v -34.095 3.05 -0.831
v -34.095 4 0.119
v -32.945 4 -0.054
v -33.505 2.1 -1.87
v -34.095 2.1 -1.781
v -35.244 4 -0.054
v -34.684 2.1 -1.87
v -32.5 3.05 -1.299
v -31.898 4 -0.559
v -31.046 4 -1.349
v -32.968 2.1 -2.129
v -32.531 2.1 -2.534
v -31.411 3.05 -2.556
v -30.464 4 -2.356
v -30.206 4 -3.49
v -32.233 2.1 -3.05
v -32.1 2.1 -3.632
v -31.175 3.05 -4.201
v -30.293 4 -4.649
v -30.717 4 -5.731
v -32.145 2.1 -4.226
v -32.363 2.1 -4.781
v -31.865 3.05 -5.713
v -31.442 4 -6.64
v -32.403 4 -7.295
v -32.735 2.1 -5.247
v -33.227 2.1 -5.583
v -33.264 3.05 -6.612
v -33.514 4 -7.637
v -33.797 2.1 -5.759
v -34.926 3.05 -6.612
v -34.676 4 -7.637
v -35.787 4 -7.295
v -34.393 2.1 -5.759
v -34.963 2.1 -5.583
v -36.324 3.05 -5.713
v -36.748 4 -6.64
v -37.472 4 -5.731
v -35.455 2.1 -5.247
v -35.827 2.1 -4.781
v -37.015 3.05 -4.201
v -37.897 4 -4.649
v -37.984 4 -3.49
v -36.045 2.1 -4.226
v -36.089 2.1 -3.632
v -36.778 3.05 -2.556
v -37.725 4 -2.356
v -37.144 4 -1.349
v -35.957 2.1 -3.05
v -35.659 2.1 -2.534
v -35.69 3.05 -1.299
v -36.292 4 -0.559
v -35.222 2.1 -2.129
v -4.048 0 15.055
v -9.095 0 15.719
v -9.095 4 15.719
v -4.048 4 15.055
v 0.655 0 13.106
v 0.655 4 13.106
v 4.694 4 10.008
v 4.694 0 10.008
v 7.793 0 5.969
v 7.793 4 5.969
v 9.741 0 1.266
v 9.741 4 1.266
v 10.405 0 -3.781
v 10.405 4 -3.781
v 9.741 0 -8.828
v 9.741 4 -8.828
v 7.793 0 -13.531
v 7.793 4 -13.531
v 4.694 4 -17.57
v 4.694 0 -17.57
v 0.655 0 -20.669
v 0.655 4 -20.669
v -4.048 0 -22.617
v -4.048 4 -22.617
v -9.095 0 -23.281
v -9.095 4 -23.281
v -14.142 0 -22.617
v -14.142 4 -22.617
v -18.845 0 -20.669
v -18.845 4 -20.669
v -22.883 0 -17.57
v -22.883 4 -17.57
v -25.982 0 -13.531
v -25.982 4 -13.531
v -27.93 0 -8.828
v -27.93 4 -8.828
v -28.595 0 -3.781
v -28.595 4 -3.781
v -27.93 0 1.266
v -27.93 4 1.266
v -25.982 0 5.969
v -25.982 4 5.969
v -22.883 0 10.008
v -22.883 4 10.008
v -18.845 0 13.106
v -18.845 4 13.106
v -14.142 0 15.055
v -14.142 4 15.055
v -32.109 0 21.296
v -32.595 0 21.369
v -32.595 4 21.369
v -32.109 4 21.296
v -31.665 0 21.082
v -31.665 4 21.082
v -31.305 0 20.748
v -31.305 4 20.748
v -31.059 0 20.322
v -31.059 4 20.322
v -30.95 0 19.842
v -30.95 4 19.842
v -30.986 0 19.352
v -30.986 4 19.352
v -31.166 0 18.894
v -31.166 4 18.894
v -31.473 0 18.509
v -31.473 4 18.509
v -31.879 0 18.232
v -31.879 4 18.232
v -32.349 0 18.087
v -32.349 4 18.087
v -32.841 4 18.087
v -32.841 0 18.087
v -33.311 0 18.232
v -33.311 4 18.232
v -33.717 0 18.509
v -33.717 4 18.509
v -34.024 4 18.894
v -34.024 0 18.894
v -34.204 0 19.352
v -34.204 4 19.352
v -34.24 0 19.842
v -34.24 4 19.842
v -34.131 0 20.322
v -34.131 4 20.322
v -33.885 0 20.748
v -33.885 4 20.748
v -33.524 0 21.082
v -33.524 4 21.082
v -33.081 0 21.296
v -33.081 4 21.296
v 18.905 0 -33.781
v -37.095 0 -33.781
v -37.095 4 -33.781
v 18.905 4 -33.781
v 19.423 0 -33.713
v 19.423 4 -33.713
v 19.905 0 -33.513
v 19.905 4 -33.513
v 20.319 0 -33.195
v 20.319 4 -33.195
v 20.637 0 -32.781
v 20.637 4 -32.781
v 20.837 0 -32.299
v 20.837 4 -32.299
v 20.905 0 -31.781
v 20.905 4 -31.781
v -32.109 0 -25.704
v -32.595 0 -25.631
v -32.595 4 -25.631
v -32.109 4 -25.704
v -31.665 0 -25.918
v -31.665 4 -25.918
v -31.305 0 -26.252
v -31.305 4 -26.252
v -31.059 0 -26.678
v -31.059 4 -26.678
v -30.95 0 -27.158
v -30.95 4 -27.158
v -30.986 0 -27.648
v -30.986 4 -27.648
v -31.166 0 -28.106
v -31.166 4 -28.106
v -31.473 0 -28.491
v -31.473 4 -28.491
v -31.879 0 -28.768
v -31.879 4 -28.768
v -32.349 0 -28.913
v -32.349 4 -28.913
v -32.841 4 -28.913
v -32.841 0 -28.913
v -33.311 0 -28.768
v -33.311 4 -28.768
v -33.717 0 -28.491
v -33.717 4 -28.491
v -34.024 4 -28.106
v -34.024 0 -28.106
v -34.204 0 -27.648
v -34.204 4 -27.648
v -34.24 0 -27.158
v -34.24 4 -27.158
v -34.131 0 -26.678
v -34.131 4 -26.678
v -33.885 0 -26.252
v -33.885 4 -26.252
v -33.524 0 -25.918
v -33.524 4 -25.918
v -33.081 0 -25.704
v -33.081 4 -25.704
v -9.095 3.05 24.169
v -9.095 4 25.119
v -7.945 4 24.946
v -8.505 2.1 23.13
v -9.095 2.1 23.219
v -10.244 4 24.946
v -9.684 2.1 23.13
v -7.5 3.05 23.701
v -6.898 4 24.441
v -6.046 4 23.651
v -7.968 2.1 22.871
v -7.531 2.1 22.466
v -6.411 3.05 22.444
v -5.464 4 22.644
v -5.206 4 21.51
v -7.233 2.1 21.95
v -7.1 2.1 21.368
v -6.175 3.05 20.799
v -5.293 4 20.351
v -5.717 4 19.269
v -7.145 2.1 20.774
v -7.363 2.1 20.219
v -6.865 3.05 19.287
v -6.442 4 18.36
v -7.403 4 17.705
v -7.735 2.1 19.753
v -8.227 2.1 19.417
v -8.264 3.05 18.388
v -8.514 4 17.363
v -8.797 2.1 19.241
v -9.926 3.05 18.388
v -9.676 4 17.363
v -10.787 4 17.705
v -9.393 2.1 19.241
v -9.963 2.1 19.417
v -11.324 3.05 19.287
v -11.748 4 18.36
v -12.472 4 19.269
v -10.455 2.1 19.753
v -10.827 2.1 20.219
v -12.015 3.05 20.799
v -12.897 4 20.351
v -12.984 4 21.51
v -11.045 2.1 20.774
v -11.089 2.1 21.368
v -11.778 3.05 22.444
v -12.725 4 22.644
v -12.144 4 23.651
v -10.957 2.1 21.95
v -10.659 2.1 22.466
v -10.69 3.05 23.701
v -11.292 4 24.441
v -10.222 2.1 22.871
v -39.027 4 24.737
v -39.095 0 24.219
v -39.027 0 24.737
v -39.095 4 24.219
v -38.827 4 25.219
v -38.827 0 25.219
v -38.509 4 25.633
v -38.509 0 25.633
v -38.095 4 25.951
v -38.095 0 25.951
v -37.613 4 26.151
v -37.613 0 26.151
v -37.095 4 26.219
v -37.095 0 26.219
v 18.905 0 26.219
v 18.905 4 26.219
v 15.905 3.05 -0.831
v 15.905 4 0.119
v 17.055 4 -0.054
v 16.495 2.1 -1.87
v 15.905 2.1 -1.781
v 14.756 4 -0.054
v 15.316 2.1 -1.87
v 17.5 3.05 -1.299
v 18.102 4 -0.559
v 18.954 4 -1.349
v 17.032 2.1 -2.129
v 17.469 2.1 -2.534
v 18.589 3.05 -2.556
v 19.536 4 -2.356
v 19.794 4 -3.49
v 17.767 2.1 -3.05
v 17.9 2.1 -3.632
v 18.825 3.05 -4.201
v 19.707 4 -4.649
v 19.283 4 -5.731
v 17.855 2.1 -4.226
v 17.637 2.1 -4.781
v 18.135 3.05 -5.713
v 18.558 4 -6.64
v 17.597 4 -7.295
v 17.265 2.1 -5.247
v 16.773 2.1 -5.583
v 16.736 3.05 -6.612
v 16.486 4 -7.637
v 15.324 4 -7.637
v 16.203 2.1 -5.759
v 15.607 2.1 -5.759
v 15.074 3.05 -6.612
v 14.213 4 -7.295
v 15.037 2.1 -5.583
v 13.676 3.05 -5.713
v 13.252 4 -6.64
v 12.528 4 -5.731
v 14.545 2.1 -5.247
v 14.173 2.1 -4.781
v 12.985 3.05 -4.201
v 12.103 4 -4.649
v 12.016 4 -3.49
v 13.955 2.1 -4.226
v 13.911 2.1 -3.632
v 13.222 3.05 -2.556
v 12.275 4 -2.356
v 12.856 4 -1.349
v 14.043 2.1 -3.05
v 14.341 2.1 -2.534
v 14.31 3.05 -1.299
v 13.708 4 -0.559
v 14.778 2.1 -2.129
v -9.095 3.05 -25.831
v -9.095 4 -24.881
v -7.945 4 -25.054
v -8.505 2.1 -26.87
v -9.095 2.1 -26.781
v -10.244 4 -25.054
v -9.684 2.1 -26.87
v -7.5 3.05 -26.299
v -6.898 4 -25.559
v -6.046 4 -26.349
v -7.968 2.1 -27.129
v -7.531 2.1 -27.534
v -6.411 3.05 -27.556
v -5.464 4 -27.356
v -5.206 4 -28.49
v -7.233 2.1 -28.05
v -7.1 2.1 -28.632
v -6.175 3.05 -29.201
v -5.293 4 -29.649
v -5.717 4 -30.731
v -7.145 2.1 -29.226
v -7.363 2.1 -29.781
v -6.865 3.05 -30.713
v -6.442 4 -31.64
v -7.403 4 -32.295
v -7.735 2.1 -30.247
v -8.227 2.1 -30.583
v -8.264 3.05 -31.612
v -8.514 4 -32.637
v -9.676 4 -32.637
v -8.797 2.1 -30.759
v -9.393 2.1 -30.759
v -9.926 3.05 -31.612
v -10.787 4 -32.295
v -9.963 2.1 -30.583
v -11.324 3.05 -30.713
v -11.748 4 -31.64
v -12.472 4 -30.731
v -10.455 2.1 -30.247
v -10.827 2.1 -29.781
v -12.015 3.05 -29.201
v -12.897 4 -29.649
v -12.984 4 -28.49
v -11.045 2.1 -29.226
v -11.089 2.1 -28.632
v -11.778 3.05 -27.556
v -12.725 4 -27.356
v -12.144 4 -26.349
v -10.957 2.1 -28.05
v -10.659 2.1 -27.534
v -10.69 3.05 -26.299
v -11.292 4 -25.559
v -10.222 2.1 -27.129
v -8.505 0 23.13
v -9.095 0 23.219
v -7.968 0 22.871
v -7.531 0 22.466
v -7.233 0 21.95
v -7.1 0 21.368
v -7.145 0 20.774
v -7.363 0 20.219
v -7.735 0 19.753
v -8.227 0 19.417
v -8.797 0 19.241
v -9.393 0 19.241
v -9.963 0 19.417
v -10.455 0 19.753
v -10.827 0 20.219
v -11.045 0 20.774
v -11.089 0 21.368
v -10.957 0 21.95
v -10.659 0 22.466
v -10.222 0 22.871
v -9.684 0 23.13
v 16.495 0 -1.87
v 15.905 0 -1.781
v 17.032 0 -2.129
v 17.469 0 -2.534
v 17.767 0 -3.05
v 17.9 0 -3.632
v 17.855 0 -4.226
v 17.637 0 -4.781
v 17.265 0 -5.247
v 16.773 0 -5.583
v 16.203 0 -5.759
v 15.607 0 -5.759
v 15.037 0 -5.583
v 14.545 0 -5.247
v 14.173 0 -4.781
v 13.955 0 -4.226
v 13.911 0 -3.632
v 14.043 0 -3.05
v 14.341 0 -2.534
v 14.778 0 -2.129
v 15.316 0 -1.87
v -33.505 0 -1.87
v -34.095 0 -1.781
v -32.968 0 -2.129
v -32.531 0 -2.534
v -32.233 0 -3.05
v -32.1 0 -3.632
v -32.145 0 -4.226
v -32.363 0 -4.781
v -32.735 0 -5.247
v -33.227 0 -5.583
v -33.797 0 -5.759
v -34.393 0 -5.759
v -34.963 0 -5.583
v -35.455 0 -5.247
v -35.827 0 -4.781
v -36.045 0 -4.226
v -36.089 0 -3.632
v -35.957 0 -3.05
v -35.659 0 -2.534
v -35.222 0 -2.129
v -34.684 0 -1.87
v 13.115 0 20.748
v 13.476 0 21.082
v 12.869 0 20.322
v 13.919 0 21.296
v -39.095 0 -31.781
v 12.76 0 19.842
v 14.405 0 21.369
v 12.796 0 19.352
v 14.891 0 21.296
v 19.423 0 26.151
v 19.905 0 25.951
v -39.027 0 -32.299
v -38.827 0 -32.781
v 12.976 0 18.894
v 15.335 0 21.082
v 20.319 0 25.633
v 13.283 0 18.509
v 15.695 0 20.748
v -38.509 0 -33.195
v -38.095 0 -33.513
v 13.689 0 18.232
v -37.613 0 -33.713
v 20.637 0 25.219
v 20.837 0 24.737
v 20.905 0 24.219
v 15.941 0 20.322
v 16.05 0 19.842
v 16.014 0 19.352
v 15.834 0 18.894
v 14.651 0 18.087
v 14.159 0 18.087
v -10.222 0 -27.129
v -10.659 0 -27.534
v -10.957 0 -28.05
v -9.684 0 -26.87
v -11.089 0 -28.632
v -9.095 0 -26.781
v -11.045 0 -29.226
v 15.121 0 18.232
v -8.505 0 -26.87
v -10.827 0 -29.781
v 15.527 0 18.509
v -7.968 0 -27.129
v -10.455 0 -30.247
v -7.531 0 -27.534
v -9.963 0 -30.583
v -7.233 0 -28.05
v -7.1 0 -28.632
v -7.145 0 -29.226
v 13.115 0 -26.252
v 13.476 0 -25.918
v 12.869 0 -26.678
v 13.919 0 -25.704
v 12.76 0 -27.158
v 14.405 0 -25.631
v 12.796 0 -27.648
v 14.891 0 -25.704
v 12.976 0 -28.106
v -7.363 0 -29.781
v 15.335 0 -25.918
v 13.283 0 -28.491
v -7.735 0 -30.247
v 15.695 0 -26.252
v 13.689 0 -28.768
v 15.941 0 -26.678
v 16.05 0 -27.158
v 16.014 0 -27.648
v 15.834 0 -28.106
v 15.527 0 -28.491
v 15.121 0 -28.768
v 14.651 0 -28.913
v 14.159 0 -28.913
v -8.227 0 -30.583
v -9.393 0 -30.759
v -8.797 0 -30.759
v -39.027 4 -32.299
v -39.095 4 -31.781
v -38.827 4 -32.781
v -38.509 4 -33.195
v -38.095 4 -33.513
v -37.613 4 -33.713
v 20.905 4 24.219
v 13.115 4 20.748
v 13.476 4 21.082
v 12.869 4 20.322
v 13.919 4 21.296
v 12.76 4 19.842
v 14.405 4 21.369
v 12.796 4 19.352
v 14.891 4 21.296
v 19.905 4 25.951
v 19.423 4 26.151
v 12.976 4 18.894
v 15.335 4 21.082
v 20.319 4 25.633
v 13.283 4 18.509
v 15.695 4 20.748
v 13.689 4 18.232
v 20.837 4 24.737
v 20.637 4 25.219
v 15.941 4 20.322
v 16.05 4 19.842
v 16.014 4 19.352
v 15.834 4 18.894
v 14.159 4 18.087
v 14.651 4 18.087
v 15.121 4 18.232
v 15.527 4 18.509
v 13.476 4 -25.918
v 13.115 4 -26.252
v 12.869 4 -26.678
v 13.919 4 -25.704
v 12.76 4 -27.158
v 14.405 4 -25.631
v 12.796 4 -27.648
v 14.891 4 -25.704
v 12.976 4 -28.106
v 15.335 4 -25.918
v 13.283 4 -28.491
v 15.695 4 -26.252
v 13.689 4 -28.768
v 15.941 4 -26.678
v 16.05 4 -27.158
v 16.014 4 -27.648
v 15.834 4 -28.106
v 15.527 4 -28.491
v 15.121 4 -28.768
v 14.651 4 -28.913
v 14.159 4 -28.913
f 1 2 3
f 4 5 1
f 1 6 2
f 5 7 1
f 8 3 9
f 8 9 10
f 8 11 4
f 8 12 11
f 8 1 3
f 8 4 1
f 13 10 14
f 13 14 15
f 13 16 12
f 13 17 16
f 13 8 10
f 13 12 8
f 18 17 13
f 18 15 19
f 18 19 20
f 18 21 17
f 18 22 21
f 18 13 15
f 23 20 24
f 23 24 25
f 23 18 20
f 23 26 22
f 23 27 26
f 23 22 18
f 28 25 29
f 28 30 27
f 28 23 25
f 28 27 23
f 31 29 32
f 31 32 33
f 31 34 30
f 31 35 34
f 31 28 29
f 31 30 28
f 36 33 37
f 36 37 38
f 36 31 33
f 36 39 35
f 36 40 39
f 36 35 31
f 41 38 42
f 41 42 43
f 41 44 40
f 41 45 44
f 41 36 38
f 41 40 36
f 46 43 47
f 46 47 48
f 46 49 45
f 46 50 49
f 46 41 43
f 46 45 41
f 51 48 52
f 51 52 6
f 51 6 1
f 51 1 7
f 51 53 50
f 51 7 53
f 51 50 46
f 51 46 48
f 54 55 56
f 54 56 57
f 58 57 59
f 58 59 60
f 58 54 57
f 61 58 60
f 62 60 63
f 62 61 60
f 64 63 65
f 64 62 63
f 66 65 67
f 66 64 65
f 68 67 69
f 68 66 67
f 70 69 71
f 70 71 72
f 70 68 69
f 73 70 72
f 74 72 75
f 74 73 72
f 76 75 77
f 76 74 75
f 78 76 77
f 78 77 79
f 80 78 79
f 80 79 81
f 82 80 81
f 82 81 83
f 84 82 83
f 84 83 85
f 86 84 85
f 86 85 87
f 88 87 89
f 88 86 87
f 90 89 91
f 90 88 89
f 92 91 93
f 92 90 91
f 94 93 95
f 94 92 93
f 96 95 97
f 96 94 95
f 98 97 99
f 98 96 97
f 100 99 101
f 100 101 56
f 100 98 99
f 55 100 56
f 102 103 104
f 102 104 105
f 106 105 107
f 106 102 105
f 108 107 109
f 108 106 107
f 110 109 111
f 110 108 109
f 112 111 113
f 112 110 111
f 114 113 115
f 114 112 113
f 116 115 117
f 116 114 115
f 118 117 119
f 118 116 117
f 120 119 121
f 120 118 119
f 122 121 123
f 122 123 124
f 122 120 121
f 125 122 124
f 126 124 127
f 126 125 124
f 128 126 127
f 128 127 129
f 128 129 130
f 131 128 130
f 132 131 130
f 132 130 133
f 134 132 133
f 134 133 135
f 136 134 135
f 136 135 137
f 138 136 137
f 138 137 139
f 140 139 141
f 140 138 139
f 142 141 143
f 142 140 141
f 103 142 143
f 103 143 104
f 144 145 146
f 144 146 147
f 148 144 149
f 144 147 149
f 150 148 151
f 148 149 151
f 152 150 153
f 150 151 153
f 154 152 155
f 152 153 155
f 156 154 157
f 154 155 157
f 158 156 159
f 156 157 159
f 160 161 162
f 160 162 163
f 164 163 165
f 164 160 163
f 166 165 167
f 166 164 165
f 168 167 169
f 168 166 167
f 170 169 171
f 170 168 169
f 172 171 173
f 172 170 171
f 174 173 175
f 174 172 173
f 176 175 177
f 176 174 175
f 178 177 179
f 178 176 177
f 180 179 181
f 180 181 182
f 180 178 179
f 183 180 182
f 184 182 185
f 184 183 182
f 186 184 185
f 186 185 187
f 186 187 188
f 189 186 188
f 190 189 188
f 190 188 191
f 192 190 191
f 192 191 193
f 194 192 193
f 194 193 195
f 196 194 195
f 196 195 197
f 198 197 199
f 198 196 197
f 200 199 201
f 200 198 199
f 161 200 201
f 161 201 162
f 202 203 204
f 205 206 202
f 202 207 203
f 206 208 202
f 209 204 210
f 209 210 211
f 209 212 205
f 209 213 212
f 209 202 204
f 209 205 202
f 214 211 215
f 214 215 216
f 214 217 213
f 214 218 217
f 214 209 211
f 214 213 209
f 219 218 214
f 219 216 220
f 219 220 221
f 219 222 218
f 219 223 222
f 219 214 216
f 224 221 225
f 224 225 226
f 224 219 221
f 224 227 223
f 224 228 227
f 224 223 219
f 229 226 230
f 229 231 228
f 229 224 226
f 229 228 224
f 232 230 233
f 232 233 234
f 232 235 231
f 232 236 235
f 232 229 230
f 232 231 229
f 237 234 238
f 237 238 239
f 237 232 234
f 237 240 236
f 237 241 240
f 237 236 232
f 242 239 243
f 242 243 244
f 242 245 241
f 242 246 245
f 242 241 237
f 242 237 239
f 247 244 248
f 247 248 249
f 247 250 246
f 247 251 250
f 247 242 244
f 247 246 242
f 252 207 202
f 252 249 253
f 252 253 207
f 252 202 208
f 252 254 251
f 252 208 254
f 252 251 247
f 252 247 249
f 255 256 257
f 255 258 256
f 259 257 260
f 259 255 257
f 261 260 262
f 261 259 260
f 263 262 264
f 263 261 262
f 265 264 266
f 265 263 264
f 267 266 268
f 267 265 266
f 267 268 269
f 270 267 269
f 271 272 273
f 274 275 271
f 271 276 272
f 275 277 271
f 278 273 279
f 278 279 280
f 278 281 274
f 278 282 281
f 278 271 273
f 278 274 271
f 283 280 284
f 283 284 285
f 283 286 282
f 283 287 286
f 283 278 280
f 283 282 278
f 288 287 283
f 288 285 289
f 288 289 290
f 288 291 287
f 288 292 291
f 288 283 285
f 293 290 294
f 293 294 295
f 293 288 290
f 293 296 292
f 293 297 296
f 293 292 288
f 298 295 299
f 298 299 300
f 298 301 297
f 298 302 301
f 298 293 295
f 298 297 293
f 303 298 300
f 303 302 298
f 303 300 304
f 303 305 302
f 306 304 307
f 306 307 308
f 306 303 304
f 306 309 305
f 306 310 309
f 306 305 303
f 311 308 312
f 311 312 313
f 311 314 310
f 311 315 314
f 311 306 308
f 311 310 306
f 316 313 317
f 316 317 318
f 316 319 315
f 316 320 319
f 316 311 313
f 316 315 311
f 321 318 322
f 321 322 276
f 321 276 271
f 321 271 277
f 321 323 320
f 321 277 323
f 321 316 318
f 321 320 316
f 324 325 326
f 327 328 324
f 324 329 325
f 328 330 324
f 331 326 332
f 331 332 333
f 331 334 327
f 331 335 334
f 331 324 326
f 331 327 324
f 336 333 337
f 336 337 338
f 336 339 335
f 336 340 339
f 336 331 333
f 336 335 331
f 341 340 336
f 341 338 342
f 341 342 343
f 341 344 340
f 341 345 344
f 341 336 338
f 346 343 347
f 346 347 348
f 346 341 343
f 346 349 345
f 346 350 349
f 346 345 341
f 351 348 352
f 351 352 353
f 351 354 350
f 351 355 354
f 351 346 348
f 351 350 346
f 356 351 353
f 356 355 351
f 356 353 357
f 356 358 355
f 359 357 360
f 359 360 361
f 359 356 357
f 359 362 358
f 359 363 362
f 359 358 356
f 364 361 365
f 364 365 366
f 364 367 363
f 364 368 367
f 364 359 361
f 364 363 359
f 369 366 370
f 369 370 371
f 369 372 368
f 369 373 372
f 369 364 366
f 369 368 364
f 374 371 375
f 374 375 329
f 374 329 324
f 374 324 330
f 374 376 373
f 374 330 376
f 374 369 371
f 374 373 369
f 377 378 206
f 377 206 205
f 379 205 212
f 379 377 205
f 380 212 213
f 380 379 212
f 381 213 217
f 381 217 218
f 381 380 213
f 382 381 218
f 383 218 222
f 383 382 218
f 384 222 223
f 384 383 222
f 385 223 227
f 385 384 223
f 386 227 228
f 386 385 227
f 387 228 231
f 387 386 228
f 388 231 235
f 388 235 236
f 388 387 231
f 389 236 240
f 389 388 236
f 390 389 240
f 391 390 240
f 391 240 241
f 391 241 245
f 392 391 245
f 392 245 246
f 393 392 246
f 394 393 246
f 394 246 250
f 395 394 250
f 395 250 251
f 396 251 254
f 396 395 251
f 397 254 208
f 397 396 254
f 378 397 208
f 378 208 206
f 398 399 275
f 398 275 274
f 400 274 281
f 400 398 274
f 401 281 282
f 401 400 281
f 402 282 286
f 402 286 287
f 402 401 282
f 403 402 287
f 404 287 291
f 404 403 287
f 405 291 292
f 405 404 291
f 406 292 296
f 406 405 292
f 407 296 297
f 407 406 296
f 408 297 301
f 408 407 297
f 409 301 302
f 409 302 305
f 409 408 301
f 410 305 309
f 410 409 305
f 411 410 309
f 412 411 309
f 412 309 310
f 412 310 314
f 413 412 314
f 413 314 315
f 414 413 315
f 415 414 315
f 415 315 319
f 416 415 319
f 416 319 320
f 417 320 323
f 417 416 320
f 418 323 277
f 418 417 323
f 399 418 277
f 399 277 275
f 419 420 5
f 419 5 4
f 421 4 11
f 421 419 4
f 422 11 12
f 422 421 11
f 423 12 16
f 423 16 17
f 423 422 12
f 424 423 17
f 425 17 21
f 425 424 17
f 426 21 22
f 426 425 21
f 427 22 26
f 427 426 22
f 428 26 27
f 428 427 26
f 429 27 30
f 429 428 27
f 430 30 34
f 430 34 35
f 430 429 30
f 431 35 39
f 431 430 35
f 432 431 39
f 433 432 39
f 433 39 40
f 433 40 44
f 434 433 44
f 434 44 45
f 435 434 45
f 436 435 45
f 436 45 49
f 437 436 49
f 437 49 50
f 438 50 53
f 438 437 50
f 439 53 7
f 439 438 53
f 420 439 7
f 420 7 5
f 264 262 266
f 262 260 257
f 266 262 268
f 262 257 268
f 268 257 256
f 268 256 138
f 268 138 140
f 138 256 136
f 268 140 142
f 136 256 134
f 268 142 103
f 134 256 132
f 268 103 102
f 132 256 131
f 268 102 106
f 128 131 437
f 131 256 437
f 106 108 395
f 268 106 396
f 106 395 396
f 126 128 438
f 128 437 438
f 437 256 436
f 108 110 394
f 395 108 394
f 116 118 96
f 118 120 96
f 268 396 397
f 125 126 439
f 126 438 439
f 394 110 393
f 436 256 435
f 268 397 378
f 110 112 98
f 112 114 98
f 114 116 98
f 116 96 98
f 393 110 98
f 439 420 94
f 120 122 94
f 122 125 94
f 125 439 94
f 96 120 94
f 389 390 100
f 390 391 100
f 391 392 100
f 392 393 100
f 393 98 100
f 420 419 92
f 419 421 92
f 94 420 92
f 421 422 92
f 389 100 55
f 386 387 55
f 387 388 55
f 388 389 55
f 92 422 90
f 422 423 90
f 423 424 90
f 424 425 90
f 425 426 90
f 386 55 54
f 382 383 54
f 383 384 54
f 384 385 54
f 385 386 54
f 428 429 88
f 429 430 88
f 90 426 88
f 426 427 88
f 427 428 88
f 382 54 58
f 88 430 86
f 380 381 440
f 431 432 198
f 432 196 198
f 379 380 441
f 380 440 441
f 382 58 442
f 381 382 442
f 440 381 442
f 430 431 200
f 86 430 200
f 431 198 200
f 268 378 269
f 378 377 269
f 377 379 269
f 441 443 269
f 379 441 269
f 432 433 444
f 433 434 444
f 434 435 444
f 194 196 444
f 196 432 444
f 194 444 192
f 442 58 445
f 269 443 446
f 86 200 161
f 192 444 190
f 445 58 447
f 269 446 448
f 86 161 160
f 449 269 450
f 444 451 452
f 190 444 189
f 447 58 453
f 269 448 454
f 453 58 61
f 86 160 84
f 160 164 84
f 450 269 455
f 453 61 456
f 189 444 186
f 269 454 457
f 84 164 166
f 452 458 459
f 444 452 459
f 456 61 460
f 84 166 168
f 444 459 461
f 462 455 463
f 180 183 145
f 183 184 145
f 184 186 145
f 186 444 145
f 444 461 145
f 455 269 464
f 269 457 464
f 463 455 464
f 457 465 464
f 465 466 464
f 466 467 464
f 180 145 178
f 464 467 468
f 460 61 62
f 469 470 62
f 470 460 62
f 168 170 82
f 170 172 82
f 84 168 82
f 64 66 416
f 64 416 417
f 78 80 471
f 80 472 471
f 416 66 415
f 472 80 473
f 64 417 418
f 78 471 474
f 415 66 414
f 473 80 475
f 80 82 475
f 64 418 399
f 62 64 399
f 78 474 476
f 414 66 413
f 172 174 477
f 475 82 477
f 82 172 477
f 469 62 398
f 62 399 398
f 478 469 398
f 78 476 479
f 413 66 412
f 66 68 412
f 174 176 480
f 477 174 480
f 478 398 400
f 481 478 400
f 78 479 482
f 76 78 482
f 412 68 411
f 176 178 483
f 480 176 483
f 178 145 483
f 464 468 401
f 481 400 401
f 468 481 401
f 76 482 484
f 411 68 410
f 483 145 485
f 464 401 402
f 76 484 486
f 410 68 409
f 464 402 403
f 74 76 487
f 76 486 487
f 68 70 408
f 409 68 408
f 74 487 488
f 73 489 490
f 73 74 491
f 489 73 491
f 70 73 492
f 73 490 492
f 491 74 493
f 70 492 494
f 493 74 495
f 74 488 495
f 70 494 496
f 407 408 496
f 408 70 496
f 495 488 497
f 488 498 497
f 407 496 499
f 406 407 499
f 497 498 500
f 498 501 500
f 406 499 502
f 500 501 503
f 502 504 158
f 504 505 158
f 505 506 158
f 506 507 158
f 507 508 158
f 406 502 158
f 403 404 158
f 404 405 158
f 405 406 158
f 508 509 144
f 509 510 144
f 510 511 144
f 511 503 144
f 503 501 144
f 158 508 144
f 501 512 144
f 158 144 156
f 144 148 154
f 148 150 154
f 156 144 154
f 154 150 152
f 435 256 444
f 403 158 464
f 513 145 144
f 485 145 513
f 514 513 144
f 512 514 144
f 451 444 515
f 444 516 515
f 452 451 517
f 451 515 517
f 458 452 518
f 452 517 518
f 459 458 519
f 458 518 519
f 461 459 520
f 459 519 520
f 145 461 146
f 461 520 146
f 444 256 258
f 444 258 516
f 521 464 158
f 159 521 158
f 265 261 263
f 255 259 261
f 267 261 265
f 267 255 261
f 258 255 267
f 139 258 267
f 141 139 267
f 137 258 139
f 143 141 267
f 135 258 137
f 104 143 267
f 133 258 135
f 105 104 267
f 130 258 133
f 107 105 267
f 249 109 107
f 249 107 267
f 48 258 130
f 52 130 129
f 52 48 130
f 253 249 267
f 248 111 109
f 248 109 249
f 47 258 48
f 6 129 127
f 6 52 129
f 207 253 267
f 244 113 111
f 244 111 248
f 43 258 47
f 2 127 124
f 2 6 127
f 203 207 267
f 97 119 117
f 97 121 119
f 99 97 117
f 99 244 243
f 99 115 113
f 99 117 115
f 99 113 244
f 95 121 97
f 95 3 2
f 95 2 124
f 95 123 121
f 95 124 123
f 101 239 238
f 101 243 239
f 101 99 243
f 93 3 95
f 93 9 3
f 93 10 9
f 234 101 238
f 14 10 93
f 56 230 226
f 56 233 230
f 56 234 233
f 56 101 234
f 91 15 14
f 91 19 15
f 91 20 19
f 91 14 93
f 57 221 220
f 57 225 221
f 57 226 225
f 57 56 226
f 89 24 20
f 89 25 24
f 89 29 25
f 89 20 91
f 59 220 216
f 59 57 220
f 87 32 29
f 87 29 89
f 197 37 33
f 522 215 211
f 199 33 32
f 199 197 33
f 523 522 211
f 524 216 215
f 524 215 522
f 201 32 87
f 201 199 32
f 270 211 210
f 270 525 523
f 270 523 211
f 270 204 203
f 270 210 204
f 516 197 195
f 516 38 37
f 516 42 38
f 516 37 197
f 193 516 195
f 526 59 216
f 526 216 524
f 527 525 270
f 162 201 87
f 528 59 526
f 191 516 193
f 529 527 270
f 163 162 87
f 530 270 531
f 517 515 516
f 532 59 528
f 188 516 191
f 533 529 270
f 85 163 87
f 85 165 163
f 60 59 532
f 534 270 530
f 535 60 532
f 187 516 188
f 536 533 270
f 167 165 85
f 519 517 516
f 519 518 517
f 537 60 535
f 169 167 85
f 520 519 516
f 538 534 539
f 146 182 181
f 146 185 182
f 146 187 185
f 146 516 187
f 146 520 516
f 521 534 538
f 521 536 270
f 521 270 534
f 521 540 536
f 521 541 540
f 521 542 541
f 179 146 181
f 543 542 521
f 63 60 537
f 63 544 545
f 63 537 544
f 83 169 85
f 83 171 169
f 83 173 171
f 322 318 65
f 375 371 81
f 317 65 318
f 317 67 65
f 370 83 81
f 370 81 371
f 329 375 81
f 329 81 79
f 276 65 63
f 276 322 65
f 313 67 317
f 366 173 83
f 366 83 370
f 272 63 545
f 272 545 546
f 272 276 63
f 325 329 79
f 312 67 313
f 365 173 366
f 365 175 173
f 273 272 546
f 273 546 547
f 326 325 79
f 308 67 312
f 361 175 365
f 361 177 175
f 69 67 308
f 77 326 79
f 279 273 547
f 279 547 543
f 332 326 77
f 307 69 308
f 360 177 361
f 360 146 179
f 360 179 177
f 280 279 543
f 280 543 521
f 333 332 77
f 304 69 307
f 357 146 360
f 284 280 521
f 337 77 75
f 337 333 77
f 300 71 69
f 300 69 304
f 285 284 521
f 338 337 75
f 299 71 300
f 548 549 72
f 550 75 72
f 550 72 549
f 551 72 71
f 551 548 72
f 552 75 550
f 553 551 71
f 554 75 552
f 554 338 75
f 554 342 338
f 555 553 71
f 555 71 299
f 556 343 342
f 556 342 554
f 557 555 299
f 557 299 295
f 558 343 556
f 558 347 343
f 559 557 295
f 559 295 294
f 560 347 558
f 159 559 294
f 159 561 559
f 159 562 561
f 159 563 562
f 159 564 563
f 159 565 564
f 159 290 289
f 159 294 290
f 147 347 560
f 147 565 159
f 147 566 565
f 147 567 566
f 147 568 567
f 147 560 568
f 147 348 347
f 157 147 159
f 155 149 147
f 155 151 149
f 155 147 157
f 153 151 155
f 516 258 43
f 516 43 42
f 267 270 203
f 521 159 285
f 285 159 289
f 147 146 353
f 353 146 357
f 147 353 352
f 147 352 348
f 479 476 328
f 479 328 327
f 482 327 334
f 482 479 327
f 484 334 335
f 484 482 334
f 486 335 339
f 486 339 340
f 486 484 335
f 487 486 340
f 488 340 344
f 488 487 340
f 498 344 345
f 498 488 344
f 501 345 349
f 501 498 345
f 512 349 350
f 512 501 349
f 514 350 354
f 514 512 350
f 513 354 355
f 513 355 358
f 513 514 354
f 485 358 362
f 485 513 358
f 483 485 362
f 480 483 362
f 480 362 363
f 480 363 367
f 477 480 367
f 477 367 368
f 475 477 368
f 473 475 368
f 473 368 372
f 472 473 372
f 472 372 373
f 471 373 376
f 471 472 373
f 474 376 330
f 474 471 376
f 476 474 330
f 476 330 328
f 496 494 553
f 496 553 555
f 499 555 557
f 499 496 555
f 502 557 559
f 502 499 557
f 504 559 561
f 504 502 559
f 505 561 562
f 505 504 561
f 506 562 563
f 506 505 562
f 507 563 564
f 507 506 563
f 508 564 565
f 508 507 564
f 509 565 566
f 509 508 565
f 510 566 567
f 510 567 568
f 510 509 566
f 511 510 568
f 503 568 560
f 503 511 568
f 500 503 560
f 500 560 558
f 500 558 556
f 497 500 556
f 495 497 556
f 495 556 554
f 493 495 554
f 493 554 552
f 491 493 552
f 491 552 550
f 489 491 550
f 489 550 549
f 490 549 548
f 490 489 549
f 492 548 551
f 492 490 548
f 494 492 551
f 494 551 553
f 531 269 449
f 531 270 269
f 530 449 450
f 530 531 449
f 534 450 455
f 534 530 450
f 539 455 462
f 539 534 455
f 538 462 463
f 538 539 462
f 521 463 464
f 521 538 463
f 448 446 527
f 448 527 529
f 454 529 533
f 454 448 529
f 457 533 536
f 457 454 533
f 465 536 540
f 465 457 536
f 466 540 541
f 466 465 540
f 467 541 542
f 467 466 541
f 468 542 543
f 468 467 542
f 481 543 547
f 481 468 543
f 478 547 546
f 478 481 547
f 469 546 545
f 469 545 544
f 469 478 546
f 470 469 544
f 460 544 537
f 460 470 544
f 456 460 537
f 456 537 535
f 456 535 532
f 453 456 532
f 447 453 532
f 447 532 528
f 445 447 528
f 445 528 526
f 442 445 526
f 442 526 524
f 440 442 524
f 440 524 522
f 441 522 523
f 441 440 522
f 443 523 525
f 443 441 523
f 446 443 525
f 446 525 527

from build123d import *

# Parameters (mm, degrees)
SKETCH_1_W      = 60
SKETCH_1_H      = 60
SKETCH_1_R      = 1.65
SKETCH_1_R_2    = 19.5
SKETCH_1_R_3    = 2
EXTRUDE_1_DEPTH = 4
FILLET_1_R      = 2
CHAMFER_1_SIZE  = 1.9


with BuildPart() as part:
    # Эскиз1 → Бобышка-Вытянуть1 (new body)
    with BuildSketch(Plane(origin=(0, 0, 0), x_dir=(1, 0, 0), z_dir=(0, 1, 0))):
        with Locations((-9.094903125, 3.781032797)):
            Rectangle(SKETCH_1_W, SKETCH_1_H)
        with Locations(Location((-32.594903125, 27.281032797, 0), (0, 0, 270))):
            Circle(SKETCH_1_R, mode=Mode.SUBTRACT)
        with Locations(Location((14.405096875, 27.281032797, 0), (0, 0, 270))):
            Circle(SKETCH_1_R, mode=Mode.SUBTRACT)
        with Locations(Location((-32.594903125, -19.718967203, 0), (0, 0, 270))):
            Circle(SKETCH_1_R, mode=Mode.SUBTRACT)
        with Locations(Location((14.405096875, -19.718967203, 0), (0, 0, 270))):
            Circle(SKETCH_1_R, mode=Mode.SUBTRACT)
        with Locations(Location((-9.094903125, 3.781032797, 0), (0, 0, 270))):
            Circle(SKETCH_1_R_2, mode=Mode.SUBTRACT)
        with Locations(Location((-34.094903125, 3.781032797, 0), (0, 0, 270))):
            Circle(SKETCH_1_R_3, mode=Mode.SUBTRACT)
        with Locations(Location((15.905096875, 3.781032797, 0), (0, 0, 270))):
            Circle(SKETCH_1_R_3, mode=Mode.SUBTRACT)
        with Locations(Location((-9.094903125, 28.781032797, 0), (0, 0, 270))):
            Circle(SKETCH_1_R_3, mode=Mode.SUBTRACT)
        with Locations(Location((-9.094903125, -21.218967203, 0), (0, 0, 270))):
            Circle(SKETCH_1_R_3, mode=Mode.SUBTRACT)
    extrude(amount=EXTRUDE_1_DEPTH)

    # Скругление1
    fillet_1_edges = [part.edges().sort_by_distance(p)[0] for p in [
        (-39.094903125, 2, -33.781032797),
        (20.905096875, 2, -33.781032797),
        (20.905096875, 2, 26.218967203),
        (-39.094903125, 2, 26.218967203),
    ]]
    fillet(fillet_1_edges, radius=FILLET_1_R)

    # Фаска1
    chamfer_1_edges = [part.edges().sort_by_distance(p)[0] for p in [
        (-34.094903125, 4, -5.781032797),
        (15.905096875, 4, -5.781032797),
        (-9.094903125, 4, -30.781032797),
        (-9.094903125, 4, 19.218967203),
    ]]
    chamfer(chamfer_1_edges, length=CHAMFER_1_SIZE)


solid = part.part
